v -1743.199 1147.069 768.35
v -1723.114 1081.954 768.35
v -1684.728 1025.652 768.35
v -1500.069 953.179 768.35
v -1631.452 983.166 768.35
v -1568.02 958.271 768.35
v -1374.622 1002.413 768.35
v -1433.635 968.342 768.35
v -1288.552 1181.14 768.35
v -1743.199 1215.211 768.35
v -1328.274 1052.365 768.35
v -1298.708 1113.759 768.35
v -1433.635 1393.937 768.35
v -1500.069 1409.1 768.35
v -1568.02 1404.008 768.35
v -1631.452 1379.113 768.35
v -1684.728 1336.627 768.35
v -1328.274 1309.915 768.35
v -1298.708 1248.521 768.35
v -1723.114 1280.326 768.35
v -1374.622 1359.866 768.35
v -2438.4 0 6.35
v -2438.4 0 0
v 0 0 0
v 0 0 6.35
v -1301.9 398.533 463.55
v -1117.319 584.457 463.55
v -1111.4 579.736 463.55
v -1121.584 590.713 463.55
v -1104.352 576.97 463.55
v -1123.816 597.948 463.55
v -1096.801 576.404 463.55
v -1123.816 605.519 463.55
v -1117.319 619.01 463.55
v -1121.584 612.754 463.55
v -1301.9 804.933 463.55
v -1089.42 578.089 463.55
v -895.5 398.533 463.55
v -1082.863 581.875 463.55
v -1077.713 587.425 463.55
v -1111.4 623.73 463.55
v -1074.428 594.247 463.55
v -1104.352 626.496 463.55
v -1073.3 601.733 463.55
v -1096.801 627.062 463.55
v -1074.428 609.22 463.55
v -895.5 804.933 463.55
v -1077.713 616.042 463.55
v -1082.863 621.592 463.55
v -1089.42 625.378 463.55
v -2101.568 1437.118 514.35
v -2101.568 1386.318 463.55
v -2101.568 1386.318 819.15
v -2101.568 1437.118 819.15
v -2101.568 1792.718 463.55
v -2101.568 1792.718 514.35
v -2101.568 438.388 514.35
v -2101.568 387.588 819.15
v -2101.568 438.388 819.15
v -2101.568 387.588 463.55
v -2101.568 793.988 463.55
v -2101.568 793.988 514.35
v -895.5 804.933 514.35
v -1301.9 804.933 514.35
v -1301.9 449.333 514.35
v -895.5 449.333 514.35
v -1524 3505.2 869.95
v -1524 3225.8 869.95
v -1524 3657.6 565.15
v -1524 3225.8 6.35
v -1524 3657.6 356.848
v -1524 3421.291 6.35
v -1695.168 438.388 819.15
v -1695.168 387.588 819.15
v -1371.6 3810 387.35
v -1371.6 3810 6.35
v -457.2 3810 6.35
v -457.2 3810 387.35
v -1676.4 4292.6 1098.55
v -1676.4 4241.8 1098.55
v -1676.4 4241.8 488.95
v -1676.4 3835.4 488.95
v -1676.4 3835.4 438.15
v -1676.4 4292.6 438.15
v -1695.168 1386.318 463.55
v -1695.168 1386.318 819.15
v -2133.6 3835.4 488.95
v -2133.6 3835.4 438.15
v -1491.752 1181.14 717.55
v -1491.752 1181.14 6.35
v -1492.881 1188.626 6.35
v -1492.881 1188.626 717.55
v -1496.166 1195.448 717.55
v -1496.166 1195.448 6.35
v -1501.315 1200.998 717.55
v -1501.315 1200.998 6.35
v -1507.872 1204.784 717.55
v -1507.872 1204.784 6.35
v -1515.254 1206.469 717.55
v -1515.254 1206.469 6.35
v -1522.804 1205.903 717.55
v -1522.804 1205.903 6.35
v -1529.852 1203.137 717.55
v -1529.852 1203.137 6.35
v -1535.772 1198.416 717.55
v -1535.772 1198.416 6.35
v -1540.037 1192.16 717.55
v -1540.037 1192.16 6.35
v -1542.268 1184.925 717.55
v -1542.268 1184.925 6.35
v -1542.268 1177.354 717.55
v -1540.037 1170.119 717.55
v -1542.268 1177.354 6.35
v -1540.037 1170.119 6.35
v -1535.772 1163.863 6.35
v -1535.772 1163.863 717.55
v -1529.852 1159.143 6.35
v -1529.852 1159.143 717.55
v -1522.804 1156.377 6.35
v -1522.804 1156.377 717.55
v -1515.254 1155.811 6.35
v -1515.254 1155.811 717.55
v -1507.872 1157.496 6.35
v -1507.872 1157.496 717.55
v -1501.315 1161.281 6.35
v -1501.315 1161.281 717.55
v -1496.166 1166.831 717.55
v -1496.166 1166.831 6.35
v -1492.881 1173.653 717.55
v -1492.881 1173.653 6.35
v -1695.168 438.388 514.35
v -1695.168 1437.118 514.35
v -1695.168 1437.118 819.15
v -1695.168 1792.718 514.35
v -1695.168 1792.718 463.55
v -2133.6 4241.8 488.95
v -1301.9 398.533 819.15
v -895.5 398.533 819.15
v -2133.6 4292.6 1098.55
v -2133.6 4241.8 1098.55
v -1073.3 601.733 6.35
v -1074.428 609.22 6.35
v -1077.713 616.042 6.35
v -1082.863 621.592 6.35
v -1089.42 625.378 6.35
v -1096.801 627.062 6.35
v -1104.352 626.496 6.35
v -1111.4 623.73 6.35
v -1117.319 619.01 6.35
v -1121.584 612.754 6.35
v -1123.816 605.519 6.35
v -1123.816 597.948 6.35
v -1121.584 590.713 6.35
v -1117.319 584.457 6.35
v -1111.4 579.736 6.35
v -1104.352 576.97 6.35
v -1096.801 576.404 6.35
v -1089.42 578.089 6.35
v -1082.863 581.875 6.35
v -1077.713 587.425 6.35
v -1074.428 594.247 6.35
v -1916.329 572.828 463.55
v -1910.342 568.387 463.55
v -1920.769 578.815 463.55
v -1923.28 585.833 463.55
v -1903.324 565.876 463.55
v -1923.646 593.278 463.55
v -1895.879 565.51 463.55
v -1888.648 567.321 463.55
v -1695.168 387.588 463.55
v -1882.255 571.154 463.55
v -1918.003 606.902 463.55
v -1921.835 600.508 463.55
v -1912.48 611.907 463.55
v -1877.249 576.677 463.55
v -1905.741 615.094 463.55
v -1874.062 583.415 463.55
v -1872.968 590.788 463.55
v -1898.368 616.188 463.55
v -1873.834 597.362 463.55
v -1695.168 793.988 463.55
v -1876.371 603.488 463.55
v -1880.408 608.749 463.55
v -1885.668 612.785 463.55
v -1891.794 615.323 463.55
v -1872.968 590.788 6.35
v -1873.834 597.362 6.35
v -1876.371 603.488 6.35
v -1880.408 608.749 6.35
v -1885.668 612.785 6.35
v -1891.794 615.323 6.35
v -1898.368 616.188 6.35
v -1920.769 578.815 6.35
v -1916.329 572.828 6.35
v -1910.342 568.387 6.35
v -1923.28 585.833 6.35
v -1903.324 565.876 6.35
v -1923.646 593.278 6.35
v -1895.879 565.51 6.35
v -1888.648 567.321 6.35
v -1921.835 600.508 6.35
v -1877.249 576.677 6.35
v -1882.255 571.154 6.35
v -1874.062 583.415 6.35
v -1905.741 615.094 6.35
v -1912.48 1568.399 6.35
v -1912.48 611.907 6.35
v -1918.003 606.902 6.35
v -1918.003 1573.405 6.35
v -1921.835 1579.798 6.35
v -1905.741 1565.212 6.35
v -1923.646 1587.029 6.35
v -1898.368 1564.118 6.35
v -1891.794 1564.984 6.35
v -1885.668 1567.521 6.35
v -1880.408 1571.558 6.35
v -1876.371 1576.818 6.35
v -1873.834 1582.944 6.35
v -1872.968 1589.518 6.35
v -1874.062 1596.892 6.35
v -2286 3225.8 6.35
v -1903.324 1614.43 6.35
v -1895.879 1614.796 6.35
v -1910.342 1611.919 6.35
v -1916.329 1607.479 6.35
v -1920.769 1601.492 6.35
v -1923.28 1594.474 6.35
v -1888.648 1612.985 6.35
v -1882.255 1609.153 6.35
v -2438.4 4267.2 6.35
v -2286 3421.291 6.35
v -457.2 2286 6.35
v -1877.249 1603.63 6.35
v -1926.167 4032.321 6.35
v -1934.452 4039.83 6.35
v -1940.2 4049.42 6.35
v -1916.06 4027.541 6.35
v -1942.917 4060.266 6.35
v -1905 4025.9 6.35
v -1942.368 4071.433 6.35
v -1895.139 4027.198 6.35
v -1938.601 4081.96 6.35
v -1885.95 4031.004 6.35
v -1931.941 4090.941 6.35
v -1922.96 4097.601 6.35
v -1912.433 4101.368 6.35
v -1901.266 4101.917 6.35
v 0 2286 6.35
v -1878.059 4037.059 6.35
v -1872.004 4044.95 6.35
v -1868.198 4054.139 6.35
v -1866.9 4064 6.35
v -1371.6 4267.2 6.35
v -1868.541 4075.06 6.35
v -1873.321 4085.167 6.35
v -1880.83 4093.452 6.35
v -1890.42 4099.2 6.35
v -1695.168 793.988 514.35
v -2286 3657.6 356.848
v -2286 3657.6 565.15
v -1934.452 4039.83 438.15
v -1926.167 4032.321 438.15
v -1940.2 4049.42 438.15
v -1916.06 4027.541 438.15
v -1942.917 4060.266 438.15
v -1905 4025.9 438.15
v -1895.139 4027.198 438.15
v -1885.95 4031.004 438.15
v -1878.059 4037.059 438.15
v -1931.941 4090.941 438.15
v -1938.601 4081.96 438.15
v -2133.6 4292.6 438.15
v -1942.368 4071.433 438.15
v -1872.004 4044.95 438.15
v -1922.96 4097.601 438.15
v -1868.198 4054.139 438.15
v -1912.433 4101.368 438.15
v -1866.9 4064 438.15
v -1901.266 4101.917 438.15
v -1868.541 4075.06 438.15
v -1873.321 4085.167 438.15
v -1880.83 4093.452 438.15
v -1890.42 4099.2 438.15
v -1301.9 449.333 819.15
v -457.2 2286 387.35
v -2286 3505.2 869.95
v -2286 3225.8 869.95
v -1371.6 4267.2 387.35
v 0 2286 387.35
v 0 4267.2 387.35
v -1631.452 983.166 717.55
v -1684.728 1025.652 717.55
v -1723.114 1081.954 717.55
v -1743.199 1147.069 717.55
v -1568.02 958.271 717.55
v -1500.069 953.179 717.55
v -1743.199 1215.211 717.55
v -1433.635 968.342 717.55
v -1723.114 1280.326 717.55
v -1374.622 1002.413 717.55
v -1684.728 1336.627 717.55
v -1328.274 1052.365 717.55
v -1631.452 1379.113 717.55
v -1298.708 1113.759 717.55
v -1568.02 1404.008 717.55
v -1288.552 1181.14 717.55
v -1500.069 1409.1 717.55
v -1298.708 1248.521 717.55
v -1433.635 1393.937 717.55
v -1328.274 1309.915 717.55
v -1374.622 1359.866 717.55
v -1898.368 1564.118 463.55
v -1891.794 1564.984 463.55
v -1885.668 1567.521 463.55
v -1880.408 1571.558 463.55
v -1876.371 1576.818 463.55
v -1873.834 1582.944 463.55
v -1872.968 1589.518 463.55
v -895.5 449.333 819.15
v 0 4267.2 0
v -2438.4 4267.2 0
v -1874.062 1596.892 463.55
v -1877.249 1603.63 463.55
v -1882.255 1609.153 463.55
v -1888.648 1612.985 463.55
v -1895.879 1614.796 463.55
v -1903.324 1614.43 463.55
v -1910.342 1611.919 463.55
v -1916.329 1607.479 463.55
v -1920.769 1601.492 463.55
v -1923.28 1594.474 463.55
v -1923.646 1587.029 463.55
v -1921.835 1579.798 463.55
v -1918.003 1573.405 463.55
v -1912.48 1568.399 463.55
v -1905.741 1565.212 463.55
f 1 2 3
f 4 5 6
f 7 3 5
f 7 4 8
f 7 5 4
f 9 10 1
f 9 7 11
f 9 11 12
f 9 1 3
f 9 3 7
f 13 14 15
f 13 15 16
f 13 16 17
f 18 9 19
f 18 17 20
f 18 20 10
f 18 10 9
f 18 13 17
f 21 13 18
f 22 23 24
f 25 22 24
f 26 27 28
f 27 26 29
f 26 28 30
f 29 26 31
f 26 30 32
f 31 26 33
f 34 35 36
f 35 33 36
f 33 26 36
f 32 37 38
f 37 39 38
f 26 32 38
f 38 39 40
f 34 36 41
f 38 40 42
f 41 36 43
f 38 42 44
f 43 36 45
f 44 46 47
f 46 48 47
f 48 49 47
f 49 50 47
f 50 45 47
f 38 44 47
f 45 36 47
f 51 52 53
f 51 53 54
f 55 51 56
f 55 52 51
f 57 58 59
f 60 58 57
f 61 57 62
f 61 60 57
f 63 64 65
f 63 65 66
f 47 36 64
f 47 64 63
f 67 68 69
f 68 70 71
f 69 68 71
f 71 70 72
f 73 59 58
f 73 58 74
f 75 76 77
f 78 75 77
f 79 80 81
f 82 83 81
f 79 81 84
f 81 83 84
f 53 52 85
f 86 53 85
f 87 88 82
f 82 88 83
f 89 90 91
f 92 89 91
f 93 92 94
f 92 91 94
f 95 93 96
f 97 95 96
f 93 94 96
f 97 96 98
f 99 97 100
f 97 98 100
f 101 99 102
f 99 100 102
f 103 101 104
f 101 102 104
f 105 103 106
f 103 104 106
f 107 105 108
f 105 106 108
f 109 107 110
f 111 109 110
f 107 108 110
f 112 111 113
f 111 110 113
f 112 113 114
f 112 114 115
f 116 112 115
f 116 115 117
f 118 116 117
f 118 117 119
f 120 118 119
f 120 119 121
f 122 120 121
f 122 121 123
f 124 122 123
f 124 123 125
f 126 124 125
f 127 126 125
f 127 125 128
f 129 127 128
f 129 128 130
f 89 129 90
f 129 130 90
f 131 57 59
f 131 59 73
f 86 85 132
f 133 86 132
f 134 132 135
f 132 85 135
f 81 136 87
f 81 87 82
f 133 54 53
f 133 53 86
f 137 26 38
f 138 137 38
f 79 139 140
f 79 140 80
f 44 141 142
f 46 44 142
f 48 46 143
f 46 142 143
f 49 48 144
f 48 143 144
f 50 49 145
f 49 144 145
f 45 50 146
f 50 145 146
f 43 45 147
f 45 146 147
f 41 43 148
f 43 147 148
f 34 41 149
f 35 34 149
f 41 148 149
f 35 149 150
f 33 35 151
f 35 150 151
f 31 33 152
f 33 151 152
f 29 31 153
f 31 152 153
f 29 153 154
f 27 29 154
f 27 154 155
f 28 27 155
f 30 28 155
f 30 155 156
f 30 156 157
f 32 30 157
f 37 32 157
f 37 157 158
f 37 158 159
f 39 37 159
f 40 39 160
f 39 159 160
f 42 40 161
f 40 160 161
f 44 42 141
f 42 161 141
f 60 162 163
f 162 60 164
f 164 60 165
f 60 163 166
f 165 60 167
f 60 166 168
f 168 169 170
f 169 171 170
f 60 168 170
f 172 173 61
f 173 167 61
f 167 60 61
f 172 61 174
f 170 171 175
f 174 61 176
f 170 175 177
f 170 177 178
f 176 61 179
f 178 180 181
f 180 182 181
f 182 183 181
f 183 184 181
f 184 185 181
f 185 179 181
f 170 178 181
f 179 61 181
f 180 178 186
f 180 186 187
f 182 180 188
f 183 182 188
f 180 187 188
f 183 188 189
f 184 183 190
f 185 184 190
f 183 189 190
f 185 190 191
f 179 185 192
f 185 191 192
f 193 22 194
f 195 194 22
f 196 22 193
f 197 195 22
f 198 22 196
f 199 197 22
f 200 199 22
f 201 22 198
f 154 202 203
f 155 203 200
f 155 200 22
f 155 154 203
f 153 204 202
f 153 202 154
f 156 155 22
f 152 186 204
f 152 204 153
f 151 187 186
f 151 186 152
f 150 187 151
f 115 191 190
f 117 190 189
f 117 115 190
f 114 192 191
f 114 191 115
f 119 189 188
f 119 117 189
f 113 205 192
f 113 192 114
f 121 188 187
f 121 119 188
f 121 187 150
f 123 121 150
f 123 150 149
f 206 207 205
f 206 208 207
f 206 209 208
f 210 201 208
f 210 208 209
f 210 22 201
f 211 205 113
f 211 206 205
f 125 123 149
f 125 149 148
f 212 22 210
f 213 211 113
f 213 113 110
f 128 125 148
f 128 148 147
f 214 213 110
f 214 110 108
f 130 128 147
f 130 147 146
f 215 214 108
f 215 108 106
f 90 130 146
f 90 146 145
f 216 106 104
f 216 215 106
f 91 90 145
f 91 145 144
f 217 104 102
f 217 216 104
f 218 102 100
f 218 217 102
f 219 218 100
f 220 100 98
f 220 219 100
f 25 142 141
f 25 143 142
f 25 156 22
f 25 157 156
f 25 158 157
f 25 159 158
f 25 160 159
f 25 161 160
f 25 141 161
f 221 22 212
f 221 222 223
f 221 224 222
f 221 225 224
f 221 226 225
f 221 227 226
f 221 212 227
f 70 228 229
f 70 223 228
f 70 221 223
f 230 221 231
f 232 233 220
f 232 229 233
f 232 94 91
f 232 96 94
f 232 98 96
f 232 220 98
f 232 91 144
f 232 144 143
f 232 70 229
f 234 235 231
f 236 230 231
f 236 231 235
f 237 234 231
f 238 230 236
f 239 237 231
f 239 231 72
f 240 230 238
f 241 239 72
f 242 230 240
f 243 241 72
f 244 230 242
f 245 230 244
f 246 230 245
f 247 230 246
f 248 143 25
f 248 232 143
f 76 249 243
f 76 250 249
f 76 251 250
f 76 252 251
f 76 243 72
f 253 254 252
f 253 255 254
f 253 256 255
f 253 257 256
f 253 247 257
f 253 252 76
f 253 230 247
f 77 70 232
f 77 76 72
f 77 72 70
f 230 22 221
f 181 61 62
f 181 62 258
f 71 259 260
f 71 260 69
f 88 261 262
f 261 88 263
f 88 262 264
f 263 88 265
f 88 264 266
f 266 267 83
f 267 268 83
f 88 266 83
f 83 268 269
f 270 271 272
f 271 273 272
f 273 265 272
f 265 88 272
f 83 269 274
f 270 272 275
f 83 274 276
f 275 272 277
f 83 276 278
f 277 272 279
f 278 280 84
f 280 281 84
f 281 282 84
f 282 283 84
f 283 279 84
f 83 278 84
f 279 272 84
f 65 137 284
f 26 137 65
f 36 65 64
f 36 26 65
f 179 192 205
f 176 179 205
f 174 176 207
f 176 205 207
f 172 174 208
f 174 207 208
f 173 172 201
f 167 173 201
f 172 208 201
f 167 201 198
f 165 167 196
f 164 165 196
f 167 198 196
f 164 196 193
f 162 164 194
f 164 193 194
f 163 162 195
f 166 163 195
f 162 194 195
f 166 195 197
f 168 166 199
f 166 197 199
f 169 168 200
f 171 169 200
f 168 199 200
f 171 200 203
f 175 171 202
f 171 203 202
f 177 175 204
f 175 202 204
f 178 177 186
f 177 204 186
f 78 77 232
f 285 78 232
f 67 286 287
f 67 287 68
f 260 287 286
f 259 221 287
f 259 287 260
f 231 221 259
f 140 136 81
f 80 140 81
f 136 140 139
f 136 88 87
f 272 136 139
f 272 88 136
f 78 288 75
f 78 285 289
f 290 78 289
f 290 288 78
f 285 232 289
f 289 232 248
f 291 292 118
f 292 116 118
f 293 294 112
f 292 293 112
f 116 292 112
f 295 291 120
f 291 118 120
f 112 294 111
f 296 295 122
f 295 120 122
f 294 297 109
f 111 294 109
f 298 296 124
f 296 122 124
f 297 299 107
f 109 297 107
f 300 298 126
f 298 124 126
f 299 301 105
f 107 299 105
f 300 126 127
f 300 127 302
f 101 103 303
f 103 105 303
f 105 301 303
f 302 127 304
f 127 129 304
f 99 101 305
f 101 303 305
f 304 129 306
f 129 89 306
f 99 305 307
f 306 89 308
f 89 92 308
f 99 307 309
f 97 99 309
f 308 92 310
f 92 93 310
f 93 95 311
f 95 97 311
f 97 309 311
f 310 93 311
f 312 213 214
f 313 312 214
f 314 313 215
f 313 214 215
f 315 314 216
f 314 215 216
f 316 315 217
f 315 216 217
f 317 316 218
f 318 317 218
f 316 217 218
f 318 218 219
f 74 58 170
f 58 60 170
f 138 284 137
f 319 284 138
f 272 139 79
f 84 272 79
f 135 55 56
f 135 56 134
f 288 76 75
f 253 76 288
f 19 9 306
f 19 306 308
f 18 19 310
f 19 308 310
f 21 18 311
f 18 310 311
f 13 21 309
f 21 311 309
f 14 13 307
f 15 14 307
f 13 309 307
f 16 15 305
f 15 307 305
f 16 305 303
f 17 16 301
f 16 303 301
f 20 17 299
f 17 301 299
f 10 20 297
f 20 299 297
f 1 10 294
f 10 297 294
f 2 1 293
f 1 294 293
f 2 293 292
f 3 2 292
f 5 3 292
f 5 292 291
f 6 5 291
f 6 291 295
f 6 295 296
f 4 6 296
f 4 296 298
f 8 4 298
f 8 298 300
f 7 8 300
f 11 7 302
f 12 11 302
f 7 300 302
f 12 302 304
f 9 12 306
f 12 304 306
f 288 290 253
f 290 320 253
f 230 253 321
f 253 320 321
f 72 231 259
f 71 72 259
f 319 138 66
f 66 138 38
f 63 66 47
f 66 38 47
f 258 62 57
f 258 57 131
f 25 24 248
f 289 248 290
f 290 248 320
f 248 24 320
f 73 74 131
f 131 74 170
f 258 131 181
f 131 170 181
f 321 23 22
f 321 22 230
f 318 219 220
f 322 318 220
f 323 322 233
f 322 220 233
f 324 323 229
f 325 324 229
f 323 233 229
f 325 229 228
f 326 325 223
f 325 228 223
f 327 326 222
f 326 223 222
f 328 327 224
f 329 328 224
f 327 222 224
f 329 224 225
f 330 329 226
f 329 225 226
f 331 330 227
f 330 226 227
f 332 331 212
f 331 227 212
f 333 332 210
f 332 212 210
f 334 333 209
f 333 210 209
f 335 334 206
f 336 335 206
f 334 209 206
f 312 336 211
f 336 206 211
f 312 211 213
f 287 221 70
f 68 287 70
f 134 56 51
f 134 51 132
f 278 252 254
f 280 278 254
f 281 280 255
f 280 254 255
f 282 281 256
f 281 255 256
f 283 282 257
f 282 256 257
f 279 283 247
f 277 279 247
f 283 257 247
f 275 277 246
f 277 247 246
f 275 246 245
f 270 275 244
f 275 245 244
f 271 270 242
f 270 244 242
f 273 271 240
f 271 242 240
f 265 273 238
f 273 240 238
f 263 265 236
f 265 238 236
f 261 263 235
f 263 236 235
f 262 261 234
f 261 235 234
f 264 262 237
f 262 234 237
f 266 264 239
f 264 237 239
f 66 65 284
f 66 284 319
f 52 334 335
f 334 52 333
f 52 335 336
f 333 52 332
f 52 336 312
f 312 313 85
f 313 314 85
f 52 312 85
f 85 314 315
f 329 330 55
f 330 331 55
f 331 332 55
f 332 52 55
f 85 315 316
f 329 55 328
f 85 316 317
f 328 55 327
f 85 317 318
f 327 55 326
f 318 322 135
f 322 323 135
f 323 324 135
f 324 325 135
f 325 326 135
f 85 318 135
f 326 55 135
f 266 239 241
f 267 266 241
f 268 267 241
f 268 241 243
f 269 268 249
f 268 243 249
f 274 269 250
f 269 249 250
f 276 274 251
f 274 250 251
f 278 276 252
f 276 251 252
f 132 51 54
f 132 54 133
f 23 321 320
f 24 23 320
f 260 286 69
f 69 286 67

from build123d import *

# Parameters (mm, degrees)
F0_W      = 2438.4
F0_H      = 4267.2
F1_DEPTH  = 6.35
F2_W      = 914.4
F2_H      = 457.2
F3_DEPTH  = 381
F4_W      = 762
F4_H      = 431.8
F5_DEPTH  = 863.6
F6_SIZE2  = 152.4
F6_SIZE   = 304.8
F8_DEPTH  = 762
F10_DEPTH = 431.8
F11_W     = 457.2
F11_H     = 457.2
F12_DEPTH = 50.8
F13_W     = 457.2
F13_H     = 50.8
F14_DEPTH = 609.6
F15_R     = 25.4
F16_DEPTH = 457.2
F17_W     = 406.4
F17_H     = 406.4
F18_DEPTH = 50.8
F19_W     = 406.4
F19_H     = 50.8
F20_DEPTH = 304.8
F21_R     = 25.4
F22_DEPTH = 711.2
F23_R     = 228.6
F24_DEPTH = 50.8


with BuildPart() as f1:
    # F0 (on Top) → F1 (new body)
    with BuildSketch(Plane.XY):
        with Locations((-1219.2, 2133.6)):
            Rectangle(F0_W, F0_H)
    extrude(amount=F1_DEPTH)

    # F2 (on face) → F3 (join)
    with BuildSketch(Plane.XY.offset(6.35)):
        Polygon((0, 2286), (0, 4267.2), (-457.2, 4267.2), (-457.2, 3810), (-457.2, 2286), align=None)
        with Locations((-914.4, 4038.6)):
            Rectangle(F2_W, F2_H)
    extrude(amount=F3_DEPTH)

    # F4 (on face) → F5 (join)
    with BuildSketch(Plane.XY.offset(6.35)):
        with Locations((-1905, 3441.7)):
            Rectangle(F4_W, F4_H)
    extrude(amount=F5_DEPTH)

    # F6
    f6_edges = [f1.edges().sort_by_distance(p)[0] for p in [
        (-1905, 3657.6, 869.95),
    ]]
    chamfer(f6_edges, length=F6_SIZE, length2=F6_SIZE2)

    # F7 (on face) → F8 (cut)
    with BuildSketch(Plane(origin=(-2286, 0, 0), x_dir=(0, -1, 0), z_dir=(-1, 0, 0))):
        Polygon((-3421.291113, 6.35), (-3657.6, 356.84821), (-3657.6, 6.35), align=None)
    extrude(amount=-F8_DEPTH, mode=Mode.SUBTRACT)

    # F9 (on face) → F10 (join)
    with BuildSketch(Plane.XY.offset(6.35)):
        with BuildLine():
            ThreePointArc((-1905, 4025.9), (-1878.059232, 4037.059232), (-1866.9, 4064))
            ThreePointArc((-1866.9, 4064), (-1931.940768, 4090.940768), (-1905, 4025.9))
        make_face()
    extrude(amount=F10_DEPTH)

    # F11 (on face) → F12 (join)
    with BuildSketch(Plane.XY.offset(438.15)):
        with Locations((-1905, 4064)):
            Rectangle(F11_W, F11_H)
    extrude(amount=F12_DEPTH)

    # F13 (on face) → F14 (join)
    with BuildSketch(Plane.XY.offset(488.95)):
        with Locations((-1905, 4267.2)):
            Rectangle(F13_W, F13_H)
    extrude(amount=F14_DEPTH)

    # F15 (on face) → F16 (join)
    with BuildSketch(Plane.XY.offset(6.35)):
        with BuildLine():
            ThreePointArc((-1898.368258, 1564.11849), (-1880.407746, 1571.557977), (-1872.968258, 1589.51849))
            ThreePointArc((-1872.968258, 1589.51849), (-1916.32877, 1607.479002), (-1898.368258, 1564.11849))
        make_face()
        with BuildLine():
            ThreePointArc((-1872.968258, 590.788031), (-1880.407746, 608.748544), (-1898.368258, 616.188031))
            ThreePointArc((-1898.368258, 616.188031), (-1916.32877, 572.827519), (-1872.968258, 590.788031))
        make_face()
        with Locations((-1098.69957, 601.733327)):
            Circle(F15_R)
    extrude(amount=F16_DEPTH)

    # F17 (on face) → F18 (join)
    with BuildSketch(Plane.XY.offset(463.55)):
        with Locations((-1898.368258, 1589.51849)):
            Rectangle(F17_W, F17_H)
        with Locations((-1898.368258, 590.788031)):
            Rectangle(F17_W, F17_H)
        with Locations((-1098.69957, 601.733327)):
            Rectangle(F17_W, F17_H)
    extrude(amount=F18_DEPTH)

    # F19 (on face) → F20 (join)
    with BuildSketch(Plane.XY.offset(514.35)):
        with Locations((-1898.368258, 412.988031)):
            Rectangle(F19_W, F19_H)
        with Locations((-1098.69957, 423.933327)):
            Rectangle(F19_W, F19_H)
        with Locations((-1898.368258, 1411.71849)):
            Rectangle(F19_W, F19_H)
    extrude(amount=F20_DEPTH)

    # F21 (on face) → F22 (join)
    with BuildSketch(Plane.XY.offset(6.35)):
        with Locations((-1517.152071, 1181.139708)):
            Circle(F21_R)
    extrude(amount=F22_DEPTH)

    # F23 (on face) → F24 (join)
    with BuildSketch(Plane.XY.offset(717.55)):
        with Locations((-1517.152071, 1181.139708)):
            Circle(F23_R)
    extrude(amount=F24_DEPTH)


solid = f1.part
